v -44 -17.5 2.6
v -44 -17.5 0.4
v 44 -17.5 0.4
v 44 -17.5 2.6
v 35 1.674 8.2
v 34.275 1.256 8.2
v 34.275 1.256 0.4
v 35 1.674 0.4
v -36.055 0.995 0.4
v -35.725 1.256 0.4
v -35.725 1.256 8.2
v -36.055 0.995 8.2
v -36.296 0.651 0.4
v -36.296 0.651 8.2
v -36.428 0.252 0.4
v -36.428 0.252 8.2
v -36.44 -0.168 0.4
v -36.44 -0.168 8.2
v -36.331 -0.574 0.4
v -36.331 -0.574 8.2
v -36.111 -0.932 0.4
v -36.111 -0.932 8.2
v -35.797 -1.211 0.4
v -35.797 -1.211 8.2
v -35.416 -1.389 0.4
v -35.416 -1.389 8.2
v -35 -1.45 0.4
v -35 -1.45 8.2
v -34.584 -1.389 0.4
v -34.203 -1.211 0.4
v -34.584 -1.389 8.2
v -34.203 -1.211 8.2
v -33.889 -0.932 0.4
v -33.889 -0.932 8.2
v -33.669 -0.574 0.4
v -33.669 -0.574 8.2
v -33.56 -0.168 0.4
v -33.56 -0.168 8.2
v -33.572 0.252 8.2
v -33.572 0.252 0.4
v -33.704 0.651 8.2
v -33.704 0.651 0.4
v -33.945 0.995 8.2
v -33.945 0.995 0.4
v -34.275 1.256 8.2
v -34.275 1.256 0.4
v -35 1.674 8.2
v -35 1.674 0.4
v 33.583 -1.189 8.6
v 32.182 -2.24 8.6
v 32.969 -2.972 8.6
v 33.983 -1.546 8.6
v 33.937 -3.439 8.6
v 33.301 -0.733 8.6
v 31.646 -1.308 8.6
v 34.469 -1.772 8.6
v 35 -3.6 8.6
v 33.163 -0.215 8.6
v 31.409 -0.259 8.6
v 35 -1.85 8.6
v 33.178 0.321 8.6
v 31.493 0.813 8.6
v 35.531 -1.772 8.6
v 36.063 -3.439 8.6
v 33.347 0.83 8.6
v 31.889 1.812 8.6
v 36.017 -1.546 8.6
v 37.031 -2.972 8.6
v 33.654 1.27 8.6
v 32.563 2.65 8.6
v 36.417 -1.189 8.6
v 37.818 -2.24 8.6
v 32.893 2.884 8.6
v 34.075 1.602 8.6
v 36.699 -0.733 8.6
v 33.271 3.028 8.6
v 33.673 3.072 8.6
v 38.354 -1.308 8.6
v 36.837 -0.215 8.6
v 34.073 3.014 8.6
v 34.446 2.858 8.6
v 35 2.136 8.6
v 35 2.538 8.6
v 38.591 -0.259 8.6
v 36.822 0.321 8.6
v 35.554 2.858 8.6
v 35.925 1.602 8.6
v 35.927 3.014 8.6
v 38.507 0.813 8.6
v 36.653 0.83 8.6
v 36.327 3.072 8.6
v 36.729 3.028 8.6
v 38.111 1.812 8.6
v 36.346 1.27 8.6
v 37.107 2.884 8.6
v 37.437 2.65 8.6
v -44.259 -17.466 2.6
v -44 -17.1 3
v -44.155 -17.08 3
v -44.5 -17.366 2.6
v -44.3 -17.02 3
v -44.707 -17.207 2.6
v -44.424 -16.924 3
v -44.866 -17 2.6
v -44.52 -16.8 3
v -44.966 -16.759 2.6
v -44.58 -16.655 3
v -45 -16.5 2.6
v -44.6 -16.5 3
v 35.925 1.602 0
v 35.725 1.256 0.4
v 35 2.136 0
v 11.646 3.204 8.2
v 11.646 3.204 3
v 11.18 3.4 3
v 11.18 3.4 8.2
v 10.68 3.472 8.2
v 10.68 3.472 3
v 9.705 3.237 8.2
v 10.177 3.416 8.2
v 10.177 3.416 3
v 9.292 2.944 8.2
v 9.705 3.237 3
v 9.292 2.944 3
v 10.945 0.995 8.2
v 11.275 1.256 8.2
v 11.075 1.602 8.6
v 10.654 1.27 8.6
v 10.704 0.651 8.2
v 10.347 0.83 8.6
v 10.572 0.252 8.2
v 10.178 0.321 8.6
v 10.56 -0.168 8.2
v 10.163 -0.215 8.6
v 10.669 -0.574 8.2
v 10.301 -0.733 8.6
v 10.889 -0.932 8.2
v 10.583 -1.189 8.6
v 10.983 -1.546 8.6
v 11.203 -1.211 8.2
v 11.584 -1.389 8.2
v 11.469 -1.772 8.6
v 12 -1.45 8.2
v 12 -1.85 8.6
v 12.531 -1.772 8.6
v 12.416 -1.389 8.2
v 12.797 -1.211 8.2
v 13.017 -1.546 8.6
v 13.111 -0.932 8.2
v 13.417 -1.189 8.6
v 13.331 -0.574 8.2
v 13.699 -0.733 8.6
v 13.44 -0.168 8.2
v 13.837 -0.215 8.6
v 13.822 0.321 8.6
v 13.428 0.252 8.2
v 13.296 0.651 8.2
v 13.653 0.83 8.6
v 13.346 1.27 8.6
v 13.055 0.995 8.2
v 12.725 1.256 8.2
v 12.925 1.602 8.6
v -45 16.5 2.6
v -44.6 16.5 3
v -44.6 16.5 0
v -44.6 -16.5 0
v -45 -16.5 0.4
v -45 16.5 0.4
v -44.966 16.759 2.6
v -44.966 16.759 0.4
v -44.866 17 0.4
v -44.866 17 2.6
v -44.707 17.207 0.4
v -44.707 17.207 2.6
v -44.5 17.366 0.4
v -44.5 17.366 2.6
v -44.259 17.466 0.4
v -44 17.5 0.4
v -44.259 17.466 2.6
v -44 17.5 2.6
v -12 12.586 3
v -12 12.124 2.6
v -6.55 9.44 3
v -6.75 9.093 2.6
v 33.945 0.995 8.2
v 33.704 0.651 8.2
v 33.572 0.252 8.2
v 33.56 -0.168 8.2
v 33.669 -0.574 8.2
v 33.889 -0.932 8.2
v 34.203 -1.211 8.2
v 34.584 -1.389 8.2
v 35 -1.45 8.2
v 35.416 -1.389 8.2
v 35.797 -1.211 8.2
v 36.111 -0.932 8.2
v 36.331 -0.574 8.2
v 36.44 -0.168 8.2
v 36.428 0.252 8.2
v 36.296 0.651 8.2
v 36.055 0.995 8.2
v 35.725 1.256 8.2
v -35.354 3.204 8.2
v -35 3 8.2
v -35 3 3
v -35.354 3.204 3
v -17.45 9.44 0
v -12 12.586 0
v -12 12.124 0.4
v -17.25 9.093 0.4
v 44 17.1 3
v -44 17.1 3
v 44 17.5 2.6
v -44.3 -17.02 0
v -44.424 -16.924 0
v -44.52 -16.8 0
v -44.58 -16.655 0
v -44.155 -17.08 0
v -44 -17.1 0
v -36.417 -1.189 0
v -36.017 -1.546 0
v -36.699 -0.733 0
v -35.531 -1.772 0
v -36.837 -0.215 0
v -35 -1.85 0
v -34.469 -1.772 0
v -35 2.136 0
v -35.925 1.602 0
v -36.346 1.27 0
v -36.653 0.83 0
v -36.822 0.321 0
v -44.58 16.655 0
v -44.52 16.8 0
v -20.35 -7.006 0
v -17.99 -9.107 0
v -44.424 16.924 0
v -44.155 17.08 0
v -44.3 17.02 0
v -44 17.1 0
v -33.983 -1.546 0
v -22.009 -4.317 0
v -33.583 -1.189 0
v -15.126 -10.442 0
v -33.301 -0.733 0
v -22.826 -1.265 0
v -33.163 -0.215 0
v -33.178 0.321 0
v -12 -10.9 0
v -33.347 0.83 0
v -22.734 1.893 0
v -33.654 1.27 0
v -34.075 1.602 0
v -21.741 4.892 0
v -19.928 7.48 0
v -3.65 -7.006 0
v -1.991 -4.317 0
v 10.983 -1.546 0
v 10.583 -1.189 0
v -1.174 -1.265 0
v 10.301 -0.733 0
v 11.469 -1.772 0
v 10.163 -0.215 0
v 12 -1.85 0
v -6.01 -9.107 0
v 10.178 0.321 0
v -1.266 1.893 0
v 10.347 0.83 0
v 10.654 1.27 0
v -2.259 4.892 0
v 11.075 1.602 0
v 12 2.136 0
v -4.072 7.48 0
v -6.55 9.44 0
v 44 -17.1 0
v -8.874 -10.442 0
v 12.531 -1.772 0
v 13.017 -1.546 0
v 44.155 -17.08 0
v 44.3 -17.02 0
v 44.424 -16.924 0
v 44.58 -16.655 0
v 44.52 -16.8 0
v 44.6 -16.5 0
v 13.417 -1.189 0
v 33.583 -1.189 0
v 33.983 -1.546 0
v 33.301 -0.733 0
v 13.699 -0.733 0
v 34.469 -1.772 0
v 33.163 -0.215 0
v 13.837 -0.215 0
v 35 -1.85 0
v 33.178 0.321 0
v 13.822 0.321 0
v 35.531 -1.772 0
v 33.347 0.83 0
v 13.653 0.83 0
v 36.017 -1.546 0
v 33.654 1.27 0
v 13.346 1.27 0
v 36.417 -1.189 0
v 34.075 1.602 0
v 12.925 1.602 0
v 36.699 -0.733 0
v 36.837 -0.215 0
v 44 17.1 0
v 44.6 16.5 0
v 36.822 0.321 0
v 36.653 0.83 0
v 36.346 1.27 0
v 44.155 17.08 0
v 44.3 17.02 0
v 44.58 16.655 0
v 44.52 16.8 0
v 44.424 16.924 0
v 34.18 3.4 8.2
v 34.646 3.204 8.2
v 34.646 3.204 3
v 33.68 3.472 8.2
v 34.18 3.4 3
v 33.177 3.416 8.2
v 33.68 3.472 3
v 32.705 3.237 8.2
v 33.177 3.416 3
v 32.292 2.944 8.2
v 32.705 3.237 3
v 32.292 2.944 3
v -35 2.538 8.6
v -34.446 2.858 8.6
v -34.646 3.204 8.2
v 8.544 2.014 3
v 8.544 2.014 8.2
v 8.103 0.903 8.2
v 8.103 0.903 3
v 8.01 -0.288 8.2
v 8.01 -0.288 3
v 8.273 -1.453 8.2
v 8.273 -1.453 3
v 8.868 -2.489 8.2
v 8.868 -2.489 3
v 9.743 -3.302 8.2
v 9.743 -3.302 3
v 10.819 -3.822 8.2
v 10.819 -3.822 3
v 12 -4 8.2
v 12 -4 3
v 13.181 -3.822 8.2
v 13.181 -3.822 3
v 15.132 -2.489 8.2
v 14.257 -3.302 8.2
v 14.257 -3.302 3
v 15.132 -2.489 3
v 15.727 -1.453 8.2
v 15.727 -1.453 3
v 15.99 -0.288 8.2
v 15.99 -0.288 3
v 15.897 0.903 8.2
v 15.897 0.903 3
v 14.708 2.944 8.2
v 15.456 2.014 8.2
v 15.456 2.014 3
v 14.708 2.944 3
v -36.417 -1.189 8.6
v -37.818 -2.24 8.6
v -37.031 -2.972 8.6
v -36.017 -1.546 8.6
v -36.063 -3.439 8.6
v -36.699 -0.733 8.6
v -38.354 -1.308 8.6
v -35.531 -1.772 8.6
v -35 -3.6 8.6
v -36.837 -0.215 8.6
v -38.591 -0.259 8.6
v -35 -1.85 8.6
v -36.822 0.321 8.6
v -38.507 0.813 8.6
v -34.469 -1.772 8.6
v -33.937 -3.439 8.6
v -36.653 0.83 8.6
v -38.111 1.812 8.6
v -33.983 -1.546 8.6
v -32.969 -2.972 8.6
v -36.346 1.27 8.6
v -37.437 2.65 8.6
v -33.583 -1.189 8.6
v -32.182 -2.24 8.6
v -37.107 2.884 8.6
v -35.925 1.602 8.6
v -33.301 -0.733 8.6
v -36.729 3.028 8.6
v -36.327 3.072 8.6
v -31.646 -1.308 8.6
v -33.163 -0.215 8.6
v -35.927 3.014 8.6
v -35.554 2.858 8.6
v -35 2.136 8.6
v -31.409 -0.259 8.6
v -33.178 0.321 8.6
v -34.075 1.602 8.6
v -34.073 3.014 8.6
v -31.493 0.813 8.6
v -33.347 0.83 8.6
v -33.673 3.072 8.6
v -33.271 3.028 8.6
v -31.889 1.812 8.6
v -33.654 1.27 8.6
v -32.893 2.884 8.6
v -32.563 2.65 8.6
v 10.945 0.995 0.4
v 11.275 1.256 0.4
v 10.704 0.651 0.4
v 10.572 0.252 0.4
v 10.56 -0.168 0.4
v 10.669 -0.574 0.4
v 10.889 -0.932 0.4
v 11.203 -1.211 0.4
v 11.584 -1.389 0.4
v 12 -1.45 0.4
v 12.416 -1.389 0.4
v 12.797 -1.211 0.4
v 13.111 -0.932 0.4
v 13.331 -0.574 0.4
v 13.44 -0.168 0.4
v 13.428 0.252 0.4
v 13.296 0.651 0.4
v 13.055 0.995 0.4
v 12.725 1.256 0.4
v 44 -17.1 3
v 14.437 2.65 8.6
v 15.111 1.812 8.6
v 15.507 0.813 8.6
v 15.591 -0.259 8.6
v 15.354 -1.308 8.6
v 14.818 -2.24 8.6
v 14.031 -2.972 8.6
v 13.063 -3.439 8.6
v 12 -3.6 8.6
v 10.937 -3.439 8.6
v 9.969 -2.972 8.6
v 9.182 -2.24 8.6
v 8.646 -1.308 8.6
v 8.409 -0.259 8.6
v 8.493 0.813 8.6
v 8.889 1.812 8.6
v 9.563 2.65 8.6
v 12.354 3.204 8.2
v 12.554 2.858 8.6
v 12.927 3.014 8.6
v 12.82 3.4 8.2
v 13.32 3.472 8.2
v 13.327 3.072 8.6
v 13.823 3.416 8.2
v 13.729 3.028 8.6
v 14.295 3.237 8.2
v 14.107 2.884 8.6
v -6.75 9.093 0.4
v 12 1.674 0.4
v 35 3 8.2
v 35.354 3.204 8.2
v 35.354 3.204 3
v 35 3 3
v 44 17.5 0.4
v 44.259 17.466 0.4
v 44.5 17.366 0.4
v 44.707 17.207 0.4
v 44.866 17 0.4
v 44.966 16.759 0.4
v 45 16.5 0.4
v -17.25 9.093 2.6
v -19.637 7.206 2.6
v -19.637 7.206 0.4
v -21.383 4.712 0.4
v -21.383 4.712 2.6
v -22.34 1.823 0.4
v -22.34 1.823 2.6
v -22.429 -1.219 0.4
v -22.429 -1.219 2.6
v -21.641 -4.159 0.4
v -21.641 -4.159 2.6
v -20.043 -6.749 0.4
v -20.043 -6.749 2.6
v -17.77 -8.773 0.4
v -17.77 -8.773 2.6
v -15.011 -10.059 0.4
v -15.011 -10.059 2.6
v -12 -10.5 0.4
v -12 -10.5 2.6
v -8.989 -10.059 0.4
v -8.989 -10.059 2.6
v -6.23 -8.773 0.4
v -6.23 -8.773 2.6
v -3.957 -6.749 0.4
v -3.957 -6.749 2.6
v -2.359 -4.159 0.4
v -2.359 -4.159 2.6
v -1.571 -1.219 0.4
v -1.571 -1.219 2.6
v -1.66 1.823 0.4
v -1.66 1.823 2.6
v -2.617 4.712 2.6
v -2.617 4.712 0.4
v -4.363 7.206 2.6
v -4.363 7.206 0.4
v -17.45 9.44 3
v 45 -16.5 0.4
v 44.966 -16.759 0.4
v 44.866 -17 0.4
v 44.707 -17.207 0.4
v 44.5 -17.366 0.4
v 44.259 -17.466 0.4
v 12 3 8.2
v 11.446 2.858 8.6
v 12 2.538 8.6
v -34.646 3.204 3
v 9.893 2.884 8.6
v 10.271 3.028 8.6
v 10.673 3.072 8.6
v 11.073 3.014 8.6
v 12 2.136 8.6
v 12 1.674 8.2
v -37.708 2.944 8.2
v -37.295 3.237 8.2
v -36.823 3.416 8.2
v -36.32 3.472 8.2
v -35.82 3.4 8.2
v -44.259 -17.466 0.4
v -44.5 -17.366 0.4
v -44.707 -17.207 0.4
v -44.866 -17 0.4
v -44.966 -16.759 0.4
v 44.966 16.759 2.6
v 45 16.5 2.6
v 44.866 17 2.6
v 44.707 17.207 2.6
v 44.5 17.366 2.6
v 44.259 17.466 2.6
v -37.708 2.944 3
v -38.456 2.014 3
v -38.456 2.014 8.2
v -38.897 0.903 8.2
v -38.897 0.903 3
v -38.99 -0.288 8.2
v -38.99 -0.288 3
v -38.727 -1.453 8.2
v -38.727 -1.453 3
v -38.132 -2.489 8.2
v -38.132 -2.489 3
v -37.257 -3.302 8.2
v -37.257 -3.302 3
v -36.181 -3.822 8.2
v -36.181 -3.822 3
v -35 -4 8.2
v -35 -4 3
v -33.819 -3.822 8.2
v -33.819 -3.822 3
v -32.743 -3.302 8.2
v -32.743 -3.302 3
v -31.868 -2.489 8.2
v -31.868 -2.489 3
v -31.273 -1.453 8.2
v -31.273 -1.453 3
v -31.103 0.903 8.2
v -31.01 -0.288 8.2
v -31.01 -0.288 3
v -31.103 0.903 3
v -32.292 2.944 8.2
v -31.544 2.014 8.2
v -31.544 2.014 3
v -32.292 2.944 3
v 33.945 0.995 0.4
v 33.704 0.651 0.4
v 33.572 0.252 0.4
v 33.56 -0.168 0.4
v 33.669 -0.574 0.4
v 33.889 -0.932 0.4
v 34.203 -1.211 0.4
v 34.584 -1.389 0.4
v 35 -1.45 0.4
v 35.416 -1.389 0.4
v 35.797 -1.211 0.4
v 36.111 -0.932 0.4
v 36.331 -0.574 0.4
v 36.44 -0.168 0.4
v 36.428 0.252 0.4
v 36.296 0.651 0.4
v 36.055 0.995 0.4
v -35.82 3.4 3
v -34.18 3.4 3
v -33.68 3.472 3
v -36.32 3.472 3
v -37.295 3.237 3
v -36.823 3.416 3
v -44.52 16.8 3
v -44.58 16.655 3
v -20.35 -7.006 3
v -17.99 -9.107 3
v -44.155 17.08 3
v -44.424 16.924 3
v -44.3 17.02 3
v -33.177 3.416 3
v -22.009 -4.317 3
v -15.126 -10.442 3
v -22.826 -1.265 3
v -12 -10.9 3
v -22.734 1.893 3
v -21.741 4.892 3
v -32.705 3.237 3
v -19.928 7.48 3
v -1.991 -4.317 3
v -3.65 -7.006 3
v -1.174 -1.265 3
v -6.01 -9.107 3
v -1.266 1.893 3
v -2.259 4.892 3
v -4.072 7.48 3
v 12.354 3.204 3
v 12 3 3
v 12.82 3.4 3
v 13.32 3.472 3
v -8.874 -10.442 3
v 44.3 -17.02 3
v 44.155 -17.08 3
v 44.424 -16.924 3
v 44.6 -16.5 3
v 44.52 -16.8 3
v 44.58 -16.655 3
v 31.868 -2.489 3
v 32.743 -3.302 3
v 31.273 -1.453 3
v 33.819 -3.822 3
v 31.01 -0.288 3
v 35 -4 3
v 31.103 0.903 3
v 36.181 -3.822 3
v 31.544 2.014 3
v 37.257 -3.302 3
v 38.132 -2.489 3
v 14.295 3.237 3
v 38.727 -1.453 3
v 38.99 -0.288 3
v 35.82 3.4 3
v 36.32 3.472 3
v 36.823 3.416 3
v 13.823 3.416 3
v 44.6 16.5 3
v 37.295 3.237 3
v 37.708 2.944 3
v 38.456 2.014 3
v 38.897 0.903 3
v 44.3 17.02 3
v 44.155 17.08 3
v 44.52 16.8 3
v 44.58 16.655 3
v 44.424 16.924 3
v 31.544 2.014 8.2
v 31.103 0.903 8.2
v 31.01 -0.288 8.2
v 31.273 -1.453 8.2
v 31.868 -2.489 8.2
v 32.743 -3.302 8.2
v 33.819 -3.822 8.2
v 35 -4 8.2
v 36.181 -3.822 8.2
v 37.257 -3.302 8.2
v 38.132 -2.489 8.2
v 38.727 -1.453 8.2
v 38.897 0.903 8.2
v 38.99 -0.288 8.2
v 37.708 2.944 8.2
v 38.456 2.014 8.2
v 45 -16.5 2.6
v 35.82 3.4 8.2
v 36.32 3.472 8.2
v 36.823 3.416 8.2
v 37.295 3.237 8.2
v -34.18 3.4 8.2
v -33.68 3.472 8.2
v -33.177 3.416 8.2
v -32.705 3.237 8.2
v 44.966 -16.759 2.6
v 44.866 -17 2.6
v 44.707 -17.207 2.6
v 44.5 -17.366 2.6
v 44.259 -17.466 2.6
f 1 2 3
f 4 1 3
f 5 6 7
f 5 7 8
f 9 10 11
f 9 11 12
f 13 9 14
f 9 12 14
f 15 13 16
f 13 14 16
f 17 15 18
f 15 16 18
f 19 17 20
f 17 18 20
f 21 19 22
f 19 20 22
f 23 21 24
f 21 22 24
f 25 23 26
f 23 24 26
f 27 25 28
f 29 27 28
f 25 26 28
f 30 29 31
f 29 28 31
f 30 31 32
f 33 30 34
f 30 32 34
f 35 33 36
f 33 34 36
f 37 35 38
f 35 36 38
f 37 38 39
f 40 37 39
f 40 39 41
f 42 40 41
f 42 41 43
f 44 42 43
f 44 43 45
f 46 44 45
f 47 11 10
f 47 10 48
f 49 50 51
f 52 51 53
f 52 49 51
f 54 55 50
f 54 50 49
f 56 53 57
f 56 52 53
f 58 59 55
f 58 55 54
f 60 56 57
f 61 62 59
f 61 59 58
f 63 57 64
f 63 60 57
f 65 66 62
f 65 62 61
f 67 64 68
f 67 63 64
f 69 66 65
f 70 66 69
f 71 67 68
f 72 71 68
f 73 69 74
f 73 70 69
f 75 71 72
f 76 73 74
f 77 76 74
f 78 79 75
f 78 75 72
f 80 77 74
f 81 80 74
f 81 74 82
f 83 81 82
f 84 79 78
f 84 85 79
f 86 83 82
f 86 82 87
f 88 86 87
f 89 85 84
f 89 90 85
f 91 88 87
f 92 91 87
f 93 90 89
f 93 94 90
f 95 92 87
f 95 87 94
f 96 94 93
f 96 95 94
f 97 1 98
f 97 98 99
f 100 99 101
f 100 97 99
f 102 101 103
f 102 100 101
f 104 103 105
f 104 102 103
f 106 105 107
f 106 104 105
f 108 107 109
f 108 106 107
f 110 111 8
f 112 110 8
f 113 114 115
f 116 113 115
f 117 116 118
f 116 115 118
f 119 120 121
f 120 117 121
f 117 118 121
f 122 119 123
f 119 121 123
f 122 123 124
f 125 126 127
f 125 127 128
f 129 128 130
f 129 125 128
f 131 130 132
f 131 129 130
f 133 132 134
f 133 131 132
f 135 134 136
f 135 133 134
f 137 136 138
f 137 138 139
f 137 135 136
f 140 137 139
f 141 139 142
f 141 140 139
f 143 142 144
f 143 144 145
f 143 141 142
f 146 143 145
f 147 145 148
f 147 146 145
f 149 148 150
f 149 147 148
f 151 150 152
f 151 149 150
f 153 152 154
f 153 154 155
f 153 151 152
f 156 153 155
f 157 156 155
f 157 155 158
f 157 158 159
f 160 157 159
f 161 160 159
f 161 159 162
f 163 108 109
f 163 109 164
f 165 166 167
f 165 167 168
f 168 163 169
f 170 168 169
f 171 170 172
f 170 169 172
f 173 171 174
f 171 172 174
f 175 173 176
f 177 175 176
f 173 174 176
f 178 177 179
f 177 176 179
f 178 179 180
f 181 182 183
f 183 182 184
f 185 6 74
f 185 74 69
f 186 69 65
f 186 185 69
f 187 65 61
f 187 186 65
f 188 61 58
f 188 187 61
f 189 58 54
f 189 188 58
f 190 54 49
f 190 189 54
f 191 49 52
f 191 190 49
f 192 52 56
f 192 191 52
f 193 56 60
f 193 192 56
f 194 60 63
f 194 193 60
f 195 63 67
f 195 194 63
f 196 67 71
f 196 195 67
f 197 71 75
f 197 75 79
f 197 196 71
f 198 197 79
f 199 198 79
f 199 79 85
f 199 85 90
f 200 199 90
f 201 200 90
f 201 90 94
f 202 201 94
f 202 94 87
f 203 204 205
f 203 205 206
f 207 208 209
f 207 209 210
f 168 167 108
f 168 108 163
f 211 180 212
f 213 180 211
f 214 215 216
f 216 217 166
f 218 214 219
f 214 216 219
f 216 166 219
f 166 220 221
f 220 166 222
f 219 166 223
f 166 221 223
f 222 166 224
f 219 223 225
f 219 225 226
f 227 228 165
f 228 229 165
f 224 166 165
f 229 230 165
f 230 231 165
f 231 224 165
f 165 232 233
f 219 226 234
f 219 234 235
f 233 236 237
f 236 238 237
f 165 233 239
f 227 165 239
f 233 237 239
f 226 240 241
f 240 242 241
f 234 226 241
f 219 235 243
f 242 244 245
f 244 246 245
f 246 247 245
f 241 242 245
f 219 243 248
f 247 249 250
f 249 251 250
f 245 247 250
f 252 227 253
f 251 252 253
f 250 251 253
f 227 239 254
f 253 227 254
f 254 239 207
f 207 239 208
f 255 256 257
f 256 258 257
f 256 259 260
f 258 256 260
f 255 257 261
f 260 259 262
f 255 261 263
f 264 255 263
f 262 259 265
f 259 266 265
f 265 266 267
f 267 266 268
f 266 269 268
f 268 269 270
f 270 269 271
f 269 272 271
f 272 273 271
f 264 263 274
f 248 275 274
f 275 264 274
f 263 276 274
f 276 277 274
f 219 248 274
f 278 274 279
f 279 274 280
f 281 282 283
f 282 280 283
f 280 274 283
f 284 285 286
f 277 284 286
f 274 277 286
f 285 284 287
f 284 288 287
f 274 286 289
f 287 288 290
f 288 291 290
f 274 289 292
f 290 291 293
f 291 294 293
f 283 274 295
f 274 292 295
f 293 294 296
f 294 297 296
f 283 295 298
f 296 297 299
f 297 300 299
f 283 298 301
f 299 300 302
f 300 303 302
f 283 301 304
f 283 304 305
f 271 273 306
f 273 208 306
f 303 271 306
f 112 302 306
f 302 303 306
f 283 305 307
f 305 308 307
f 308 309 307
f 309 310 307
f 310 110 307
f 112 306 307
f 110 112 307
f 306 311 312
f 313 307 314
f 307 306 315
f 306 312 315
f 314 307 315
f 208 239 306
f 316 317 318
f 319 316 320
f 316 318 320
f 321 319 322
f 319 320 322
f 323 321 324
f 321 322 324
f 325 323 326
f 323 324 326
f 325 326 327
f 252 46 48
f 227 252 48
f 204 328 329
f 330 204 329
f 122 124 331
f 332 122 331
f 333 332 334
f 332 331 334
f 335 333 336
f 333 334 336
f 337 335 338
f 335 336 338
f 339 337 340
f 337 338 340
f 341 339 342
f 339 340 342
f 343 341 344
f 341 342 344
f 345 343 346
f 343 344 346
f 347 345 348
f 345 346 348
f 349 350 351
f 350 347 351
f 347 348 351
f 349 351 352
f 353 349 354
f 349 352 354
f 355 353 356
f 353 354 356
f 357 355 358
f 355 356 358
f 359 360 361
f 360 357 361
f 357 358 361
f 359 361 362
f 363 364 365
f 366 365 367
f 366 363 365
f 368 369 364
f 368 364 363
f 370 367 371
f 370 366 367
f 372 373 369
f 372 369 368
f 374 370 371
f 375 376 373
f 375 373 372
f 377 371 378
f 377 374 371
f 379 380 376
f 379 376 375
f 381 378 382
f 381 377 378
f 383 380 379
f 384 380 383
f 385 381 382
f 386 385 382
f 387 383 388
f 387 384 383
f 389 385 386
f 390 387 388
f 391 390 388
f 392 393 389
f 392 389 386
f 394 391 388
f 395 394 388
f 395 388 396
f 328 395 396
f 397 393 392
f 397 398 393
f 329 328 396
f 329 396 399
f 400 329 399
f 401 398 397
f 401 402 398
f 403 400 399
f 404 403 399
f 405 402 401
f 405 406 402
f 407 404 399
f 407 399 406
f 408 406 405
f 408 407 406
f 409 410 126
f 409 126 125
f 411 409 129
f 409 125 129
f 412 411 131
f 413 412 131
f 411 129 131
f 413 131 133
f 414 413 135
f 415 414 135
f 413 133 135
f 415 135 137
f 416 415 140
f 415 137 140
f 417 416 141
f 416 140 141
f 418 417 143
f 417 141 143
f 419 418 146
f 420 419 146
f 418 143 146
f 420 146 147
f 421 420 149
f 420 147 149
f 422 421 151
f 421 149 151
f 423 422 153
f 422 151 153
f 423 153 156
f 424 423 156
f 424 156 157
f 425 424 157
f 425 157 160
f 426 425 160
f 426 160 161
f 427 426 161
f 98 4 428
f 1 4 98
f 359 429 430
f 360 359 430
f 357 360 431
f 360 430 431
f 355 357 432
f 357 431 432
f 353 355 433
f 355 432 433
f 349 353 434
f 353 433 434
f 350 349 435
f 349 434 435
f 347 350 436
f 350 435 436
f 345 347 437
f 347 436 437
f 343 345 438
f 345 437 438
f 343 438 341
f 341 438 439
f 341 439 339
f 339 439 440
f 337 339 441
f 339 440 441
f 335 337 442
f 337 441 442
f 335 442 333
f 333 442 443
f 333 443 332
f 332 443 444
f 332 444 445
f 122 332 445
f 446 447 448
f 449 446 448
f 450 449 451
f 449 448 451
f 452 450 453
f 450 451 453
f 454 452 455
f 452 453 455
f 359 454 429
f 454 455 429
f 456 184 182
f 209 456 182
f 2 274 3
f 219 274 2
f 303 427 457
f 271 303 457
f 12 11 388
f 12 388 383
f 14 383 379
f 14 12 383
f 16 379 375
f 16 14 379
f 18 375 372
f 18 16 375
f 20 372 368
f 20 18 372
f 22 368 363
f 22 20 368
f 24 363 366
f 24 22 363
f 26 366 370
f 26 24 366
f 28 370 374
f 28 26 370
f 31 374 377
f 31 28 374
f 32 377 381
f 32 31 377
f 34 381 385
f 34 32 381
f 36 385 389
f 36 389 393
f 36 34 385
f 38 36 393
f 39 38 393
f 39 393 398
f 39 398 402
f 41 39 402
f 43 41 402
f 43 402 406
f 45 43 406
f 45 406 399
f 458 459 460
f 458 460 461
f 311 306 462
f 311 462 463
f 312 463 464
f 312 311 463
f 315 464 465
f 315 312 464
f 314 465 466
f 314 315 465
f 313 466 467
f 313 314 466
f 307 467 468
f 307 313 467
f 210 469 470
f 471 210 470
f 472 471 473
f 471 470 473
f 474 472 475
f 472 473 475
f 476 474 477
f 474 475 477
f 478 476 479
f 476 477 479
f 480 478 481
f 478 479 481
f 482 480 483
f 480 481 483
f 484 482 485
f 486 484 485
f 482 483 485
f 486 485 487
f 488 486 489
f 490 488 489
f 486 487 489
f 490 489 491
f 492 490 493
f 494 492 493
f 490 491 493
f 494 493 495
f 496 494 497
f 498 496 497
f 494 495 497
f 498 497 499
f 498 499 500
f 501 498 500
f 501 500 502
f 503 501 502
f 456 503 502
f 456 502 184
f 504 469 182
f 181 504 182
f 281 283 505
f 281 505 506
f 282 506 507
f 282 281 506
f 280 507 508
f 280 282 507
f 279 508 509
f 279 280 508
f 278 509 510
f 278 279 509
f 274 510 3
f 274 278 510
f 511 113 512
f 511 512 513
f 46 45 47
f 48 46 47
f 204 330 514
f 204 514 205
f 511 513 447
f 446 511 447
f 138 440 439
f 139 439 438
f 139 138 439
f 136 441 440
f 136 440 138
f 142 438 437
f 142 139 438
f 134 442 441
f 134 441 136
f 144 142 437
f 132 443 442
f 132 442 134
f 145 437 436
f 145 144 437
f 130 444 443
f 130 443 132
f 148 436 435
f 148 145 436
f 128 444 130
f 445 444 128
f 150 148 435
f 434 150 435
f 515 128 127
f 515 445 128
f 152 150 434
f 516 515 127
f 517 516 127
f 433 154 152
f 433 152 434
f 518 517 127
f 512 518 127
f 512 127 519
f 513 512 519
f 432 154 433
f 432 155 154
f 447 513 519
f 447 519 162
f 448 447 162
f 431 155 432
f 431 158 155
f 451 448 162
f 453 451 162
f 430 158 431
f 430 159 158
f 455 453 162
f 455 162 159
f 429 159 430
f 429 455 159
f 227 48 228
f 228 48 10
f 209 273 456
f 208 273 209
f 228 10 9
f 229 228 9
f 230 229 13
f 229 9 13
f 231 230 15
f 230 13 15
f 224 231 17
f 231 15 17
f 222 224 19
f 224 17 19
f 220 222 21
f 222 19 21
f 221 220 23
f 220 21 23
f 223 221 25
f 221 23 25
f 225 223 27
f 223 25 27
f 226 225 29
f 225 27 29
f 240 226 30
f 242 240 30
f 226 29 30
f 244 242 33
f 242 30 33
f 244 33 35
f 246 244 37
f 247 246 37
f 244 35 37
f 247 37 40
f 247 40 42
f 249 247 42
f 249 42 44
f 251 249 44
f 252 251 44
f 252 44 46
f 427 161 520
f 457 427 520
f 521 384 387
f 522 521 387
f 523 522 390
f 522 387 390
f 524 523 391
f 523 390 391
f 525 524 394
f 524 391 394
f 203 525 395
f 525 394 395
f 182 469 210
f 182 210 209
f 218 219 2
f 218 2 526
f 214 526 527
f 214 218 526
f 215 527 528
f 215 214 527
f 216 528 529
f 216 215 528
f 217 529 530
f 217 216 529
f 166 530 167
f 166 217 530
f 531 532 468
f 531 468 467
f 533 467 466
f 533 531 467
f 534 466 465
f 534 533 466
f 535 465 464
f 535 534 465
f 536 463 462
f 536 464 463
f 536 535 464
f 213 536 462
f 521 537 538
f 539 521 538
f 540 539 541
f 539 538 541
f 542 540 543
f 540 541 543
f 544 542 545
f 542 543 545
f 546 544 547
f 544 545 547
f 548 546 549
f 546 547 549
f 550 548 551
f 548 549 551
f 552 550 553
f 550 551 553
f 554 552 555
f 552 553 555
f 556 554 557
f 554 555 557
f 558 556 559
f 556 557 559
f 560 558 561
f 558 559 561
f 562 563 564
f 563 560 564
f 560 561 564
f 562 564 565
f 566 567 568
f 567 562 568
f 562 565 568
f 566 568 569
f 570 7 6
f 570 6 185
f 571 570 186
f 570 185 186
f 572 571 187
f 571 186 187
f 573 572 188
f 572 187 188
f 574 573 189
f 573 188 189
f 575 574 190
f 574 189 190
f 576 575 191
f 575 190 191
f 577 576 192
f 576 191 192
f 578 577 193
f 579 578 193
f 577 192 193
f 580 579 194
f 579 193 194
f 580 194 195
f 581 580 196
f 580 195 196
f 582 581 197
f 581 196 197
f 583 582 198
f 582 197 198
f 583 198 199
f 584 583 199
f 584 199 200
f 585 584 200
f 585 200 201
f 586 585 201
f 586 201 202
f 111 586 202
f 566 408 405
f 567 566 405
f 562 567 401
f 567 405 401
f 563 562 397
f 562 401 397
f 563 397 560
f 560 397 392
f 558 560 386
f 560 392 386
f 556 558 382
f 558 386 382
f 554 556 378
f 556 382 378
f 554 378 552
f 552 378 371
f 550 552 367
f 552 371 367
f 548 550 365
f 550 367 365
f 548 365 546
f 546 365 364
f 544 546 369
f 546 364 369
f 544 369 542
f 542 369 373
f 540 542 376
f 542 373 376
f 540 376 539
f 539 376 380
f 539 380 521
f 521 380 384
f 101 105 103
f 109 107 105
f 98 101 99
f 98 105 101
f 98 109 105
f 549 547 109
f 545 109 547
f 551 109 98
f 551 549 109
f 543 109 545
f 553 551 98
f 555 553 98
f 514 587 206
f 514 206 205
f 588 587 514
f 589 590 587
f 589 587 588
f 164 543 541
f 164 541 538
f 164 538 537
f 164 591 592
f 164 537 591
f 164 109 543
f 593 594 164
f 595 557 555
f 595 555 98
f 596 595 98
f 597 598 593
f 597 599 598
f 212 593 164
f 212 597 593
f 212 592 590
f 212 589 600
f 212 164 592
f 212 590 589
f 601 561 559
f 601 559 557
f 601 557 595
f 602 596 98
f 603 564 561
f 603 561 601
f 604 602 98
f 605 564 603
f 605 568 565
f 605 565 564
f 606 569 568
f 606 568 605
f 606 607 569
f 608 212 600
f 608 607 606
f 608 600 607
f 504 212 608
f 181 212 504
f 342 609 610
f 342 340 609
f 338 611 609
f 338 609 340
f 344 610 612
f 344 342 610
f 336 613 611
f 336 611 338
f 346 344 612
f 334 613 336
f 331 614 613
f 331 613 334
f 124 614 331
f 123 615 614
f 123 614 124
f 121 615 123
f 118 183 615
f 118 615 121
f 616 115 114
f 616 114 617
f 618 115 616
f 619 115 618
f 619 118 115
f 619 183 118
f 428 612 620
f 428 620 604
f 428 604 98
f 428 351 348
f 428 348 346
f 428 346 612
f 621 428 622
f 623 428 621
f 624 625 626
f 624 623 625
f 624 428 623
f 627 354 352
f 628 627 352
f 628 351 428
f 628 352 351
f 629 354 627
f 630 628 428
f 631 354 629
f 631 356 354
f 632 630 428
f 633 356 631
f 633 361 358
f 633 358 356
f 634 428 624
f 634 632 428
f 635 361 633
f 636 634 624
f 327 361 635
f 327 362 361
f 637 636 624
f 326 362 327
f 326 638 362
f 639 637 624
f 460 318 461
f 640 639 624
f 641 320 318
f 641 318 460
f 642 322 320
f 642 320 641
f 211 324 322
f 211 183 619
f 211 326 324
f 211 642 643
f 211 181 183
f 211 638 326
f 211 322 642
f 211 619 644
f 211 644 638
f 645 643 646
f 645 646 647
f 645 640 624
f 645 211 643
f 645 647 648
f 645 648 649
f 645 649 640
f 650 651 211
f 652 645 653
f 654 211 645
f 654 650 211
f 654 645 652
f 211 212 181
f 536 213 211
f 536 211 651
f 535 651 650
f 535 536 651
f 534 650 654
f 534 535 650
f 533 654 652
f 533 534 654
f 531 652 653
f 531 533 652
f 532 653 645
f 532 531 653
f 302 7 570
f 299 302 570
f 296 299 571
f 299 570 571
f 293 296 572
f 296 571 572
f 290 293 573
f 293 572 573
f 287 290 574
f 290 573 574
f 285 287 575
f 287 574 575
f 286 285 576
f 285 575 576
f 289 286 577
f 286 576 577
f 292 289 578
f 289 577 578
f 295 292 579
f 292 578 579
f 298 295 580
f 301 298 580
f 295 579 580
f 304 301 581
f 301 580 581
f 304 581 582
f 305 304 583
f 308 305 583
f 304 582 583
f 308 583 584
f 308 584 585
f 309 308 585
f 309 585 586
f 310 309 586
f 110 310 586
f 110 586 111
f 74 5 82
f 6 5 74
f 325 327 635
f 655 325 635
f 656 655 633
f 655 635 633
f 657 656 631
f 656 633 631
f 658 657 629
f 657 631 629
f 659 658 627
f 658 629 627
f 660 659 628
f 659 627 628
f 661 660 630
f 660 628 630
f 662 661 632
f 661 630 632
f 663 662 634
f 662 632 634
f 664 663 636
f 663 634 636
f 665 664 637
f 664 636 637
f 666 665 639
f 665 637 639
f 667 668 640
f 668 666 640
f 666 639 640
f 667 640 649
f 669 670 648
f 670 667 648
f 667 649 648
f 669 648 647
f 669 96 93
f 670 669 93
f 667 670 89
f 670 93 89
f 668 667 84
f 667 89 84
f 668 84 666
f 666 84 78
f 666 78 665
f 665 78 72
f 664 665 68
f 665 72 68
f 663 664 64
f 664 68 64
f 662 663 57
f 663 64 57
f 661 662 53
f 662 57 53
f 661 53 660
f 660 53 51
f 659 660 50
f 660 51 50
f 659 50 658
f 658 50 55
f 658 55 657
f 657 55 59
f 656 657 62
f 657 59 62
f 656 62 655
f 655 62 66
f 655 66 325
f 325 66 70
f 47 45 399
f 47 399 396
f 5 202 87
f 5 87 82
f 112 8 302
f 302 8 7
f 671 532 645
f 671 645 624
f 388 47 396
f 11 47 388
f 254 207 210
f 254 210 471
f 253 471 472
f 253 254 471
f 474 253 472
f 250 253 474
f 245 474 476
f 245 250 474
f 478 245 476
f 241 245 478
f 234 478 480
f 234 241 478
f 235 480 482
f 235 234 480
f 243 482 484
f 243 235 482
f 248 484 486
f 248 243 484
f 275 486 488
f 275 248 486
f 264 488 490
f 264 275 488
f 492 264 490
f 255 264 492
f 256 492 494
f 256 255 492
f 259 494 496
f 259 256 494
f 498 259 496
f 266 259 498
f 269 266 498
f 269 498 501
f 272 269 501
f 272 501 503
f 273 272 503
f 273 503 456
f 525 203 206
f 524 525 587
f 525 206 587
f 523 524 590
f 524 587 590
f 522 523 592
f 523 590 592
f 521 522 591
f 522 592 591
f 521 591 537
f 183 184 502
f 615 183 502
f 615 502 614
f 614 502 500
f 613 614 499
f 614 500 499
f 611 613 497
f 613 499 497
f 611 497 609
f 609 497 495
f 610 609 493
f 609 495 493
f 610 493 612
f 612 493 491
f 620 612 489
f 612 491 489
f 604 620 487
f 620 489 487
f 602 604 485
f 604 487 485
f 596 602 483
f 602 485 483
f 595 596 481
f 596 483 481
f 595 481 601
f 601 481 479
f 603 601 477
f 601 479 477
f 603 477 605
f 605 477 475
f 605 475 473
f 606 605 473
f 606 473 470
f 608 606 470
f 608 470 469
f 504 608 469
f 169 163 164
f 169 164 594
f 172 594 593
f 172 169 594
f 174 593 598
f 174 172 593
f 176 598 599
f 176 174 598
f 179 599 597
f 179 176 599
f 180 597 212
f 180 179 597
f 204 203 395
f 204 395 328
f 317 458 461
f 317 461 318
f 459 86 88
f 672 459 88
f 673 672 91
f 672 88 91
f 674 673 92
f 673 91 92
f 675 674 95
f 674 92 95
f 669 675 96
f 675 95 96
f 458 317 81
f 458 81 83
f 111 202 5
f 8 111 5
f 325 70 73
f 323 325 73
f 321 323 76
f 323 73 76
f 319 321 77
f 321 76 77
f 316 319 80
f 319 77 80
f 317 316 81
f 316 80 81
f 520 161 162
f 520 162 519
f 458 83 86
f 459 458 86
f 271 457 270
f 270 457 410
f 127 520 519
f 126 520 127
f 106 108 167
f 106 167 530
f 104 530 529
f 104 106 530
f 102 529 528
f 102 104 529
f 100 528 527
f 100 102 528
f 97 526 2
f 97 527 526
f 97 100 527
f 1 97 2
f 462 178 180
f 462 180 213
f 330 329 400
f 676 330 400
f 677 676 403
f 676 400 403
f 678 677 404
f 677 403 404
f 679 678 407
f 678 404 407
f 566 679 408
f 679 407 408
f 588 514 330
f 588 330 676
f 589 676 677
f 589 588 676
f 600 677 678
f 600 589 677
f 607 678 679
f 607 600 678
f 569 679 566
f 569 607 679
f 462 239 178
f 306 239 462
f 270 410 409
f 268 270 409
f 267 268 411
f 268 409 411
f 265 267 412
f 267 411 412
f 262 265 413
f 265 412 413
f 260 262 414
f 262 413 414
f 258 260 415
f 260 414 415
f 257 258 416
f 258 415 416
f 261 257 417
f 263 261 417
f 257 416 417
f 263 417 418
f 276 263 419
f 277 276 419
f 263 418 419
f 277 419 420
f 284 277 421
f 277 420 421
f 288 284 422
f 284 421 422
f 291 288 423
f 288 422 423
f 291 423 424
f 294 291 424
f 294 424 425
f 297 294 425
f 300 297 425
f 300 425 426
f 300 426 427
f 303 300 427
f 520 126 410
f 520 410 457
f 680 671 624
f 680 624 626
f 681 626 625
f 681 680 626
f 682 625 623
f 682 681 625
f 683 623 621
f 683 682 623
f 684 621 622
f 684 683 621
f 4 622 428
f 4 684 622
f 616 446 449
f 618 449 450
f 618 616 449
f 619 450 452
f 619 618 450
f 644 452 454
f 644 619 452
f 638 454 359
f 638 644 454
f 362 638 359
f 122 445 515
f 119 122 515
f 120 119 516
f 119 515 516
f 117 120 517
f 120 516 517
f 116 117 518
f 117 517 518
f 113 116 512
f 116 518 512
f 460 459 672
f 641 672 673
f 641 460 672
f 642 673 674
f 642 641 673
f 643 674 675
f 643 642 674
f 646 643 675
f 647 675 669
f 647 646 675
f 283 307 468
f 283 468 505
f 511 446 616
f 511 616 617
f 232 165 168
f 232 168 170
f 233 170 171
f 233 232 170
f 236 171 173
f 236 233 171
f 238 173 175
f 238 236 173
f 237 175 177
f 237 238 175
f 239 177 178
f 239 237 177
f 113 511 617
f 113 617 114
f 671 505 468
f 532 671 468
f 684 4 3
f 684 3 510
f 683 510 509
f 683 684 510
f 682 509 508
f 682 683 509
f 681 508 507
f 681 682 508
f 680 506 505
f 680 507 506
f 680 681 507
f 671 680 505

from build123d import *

# Parameters (mm, degrees)
SKETCH_W                = 90
SKETCH_H                = 35
PAD_DEPTH               = 3
SKETCH001_R             = 10.5
HOLE_DEPTH              = 25
HOLE_TEARDROPS_DEPTH    = 25
SKETCH002_R             = 4
PAD001_DEPTH            = 5.6
POCKET_DEPTH            = 5.6
SKETCH004_R             = 1.45
HOLE001_DEPTH           = 25
HOLE001_TEARDROPS_DEPTH = 25
FILLET_R                = 2
CHAMFER_SIZE            = 0.4
FILLET001_R             = 1
CHAMFER001_SIZE         = 0.4


with BuildPart() as part:
    # Sketch → Pad (new body)
    with BuildSketch(Plane.XY):
        Rectangle(SKETCH_W, SKETCH_H)
    extrude(amount=PAD_DEPTH)

    # Sketch001 (on Face6 of Pad) → Hole (cut)
    with BuildSketch(Plane.XY.offset(3)):
        with Locations((-12, 0)):
            Circle(SKETCH001_R)
    extrude(amount=-HOLE_DEPTH, mode=Mode.SUBTRACT)

    # Sketch001_Teardrops (on Sketch) → Hole_Teardrops (cut)
    with BuildSketch(Plane.XY.offset(3)):
        with BuildLine():
            ThreePointArc((-17.25, 9.093267), (-12, -10.5), (-6.75, 9.093267))
            Line((-6.75, 9.093267), (-12, 12.124356))
            Line((-17.25, 9.093267), (-12, 12.124356))
        make_face()
    extrude(amount=-HOLE_TEARDROPS_DEPTH, mode=Mode.SUBTRACT)

    # Sketch002 (on Face5 of Hole_Teardrops) → Pad001 (join)
    with BuildSketch(Plane.XY.offset(3)):
        with Locations((35, 0)):
            Circle(SKETCH002_R)
        with Locations((12, 0)):
            Circle(SKETCH002_R)
        with Locations((-35, 0)):
            Circle(SKETCH002_R)
    extrude(amount=PAD001_DEPTH)

    # Sketch003 (on Face13 of Pad001) → Pocket (cut)
    with BuildSketch(Plane.XY.offset(8.6)):
        Polygon((-35, 3), (-38.464102, 5), (-31.535898, 5), align=None)
        Polygon((12, 3), (8.535898, 5), (15.464102, 5), align=None)
        Polygon((38.464102, 5), (35, 3), (31.535898, 5), align=None)
    extrude(amount=-POCKET_DEPTH, mode=Mode.SUBTRACT)

    # Sketch004 (on Face17 of Pocket) → Hole001 (cut)
    with BuildSketch(Plane.XY.offset(8.6)):
        with Locations((-35, 0)):
            Circle(SKETCH004_R)
        with Locations((12, 0)):
            Circle(SKETCH004_R)
        with Locations((35, 0)):
            Circle(SKETCH004_R)
    extrude(amount=-HOLE001_DEPTH, mode=Mode.SUBTRACT)

    # Sketch004_Teardrops (on Sketch) → Hole001_Teardrops (cut)
    with BuildSketch(Plane.XY.offset(8.6)):
        with BuildLine():
            ThreePointArc((-35.725, 1.255737), (-35, -1.45), (-34.275, 1.255737))
            Line((-34.275, 1.255737), (-35, 1.674316))
            Line((-35.725, 1.255737), (-35, 1.674316))
        make_face()
        with BuildLine():
            ThreePointArc((11.275, 1.255737), (12, -1.45), (12.725, 1.255737))
            Line((12.725, 1.255737), (12, 1.674316))
            Line((11.275, 1.255737), (12, 1.674316))
        make_face()
        with BuildLine():
            ThreePointArc((34.275, 1.255737), (35, -1.45), (35.725, 1.255737))
            Line((35.725, 1.255737), (35, 1.674316))
            Line((34.275, 1.255737), (35, 1.674316))
        make_face()
    extrude(amount=-HOLE001_TEARDROPS_DEPTH, mode=Mode.SUBTRACT)

    # Fillet
    fillet_edges = [part.edges().sort_by_distance(p)[0] for p in [
        (36.334875, 3.770691, 5.8),
        (33.665125, 3.770691, 5.8),
        (13.334875, 3.770691, 5.8),
        (10.665125, 3.770691, 5.8),
        (-33.665125, 3.770691, 5.8),
        (-36.334875, 3.770691, 5.8),
    ]]
    fillet(fillet_edges, radius=FILLET_R)

    # Chamfer
    chamfer_edges = [part.edges().sort_by_distance(p)[0] for p in [
        (33.392214, -3.662653, 8.6),
        (10.392214, -3.662653, 8.6),
        (-36.607786, -3.662653, 8.6),
        (-35.725, -1.255737, 8.6),
        (11.275, -1.255737, 8.6),
        (34.275, -1.255737, 8.6),
    ]]
    chamfer(chamfer_edges, length=CHAMFER_SIZE)

    # Fillet001
    fillet001_edges = [part.edges().sort_by_distance(p)[0] for p in [
        (45, 17.5, 1.5),
        (-45, 17.5, 1.5),
        (-45, -17.5, 1.5),
        (45, -17.5, 1.5),
    ]]
    fillet(fillet001_edges, radius=FILLET001_R)

    # Chamfer001
    chamfer001_edges = [part.edges().sort_by_distance(p)[0] for p in [
        (0, 17.5, 0),
        (0, 17.5, 3),
        (-35.725, -1.255737, 0),
        (-17.25, -9.093267, 0),
        (-17.25, -9.093267, 3),
        (11.275, -1.255737, 0),
        (34.275, -1.255737, 0),
    ]]
    chamfer(chamfer001_edges, length=CHAMFER001_SIZE)


solid = part.part
